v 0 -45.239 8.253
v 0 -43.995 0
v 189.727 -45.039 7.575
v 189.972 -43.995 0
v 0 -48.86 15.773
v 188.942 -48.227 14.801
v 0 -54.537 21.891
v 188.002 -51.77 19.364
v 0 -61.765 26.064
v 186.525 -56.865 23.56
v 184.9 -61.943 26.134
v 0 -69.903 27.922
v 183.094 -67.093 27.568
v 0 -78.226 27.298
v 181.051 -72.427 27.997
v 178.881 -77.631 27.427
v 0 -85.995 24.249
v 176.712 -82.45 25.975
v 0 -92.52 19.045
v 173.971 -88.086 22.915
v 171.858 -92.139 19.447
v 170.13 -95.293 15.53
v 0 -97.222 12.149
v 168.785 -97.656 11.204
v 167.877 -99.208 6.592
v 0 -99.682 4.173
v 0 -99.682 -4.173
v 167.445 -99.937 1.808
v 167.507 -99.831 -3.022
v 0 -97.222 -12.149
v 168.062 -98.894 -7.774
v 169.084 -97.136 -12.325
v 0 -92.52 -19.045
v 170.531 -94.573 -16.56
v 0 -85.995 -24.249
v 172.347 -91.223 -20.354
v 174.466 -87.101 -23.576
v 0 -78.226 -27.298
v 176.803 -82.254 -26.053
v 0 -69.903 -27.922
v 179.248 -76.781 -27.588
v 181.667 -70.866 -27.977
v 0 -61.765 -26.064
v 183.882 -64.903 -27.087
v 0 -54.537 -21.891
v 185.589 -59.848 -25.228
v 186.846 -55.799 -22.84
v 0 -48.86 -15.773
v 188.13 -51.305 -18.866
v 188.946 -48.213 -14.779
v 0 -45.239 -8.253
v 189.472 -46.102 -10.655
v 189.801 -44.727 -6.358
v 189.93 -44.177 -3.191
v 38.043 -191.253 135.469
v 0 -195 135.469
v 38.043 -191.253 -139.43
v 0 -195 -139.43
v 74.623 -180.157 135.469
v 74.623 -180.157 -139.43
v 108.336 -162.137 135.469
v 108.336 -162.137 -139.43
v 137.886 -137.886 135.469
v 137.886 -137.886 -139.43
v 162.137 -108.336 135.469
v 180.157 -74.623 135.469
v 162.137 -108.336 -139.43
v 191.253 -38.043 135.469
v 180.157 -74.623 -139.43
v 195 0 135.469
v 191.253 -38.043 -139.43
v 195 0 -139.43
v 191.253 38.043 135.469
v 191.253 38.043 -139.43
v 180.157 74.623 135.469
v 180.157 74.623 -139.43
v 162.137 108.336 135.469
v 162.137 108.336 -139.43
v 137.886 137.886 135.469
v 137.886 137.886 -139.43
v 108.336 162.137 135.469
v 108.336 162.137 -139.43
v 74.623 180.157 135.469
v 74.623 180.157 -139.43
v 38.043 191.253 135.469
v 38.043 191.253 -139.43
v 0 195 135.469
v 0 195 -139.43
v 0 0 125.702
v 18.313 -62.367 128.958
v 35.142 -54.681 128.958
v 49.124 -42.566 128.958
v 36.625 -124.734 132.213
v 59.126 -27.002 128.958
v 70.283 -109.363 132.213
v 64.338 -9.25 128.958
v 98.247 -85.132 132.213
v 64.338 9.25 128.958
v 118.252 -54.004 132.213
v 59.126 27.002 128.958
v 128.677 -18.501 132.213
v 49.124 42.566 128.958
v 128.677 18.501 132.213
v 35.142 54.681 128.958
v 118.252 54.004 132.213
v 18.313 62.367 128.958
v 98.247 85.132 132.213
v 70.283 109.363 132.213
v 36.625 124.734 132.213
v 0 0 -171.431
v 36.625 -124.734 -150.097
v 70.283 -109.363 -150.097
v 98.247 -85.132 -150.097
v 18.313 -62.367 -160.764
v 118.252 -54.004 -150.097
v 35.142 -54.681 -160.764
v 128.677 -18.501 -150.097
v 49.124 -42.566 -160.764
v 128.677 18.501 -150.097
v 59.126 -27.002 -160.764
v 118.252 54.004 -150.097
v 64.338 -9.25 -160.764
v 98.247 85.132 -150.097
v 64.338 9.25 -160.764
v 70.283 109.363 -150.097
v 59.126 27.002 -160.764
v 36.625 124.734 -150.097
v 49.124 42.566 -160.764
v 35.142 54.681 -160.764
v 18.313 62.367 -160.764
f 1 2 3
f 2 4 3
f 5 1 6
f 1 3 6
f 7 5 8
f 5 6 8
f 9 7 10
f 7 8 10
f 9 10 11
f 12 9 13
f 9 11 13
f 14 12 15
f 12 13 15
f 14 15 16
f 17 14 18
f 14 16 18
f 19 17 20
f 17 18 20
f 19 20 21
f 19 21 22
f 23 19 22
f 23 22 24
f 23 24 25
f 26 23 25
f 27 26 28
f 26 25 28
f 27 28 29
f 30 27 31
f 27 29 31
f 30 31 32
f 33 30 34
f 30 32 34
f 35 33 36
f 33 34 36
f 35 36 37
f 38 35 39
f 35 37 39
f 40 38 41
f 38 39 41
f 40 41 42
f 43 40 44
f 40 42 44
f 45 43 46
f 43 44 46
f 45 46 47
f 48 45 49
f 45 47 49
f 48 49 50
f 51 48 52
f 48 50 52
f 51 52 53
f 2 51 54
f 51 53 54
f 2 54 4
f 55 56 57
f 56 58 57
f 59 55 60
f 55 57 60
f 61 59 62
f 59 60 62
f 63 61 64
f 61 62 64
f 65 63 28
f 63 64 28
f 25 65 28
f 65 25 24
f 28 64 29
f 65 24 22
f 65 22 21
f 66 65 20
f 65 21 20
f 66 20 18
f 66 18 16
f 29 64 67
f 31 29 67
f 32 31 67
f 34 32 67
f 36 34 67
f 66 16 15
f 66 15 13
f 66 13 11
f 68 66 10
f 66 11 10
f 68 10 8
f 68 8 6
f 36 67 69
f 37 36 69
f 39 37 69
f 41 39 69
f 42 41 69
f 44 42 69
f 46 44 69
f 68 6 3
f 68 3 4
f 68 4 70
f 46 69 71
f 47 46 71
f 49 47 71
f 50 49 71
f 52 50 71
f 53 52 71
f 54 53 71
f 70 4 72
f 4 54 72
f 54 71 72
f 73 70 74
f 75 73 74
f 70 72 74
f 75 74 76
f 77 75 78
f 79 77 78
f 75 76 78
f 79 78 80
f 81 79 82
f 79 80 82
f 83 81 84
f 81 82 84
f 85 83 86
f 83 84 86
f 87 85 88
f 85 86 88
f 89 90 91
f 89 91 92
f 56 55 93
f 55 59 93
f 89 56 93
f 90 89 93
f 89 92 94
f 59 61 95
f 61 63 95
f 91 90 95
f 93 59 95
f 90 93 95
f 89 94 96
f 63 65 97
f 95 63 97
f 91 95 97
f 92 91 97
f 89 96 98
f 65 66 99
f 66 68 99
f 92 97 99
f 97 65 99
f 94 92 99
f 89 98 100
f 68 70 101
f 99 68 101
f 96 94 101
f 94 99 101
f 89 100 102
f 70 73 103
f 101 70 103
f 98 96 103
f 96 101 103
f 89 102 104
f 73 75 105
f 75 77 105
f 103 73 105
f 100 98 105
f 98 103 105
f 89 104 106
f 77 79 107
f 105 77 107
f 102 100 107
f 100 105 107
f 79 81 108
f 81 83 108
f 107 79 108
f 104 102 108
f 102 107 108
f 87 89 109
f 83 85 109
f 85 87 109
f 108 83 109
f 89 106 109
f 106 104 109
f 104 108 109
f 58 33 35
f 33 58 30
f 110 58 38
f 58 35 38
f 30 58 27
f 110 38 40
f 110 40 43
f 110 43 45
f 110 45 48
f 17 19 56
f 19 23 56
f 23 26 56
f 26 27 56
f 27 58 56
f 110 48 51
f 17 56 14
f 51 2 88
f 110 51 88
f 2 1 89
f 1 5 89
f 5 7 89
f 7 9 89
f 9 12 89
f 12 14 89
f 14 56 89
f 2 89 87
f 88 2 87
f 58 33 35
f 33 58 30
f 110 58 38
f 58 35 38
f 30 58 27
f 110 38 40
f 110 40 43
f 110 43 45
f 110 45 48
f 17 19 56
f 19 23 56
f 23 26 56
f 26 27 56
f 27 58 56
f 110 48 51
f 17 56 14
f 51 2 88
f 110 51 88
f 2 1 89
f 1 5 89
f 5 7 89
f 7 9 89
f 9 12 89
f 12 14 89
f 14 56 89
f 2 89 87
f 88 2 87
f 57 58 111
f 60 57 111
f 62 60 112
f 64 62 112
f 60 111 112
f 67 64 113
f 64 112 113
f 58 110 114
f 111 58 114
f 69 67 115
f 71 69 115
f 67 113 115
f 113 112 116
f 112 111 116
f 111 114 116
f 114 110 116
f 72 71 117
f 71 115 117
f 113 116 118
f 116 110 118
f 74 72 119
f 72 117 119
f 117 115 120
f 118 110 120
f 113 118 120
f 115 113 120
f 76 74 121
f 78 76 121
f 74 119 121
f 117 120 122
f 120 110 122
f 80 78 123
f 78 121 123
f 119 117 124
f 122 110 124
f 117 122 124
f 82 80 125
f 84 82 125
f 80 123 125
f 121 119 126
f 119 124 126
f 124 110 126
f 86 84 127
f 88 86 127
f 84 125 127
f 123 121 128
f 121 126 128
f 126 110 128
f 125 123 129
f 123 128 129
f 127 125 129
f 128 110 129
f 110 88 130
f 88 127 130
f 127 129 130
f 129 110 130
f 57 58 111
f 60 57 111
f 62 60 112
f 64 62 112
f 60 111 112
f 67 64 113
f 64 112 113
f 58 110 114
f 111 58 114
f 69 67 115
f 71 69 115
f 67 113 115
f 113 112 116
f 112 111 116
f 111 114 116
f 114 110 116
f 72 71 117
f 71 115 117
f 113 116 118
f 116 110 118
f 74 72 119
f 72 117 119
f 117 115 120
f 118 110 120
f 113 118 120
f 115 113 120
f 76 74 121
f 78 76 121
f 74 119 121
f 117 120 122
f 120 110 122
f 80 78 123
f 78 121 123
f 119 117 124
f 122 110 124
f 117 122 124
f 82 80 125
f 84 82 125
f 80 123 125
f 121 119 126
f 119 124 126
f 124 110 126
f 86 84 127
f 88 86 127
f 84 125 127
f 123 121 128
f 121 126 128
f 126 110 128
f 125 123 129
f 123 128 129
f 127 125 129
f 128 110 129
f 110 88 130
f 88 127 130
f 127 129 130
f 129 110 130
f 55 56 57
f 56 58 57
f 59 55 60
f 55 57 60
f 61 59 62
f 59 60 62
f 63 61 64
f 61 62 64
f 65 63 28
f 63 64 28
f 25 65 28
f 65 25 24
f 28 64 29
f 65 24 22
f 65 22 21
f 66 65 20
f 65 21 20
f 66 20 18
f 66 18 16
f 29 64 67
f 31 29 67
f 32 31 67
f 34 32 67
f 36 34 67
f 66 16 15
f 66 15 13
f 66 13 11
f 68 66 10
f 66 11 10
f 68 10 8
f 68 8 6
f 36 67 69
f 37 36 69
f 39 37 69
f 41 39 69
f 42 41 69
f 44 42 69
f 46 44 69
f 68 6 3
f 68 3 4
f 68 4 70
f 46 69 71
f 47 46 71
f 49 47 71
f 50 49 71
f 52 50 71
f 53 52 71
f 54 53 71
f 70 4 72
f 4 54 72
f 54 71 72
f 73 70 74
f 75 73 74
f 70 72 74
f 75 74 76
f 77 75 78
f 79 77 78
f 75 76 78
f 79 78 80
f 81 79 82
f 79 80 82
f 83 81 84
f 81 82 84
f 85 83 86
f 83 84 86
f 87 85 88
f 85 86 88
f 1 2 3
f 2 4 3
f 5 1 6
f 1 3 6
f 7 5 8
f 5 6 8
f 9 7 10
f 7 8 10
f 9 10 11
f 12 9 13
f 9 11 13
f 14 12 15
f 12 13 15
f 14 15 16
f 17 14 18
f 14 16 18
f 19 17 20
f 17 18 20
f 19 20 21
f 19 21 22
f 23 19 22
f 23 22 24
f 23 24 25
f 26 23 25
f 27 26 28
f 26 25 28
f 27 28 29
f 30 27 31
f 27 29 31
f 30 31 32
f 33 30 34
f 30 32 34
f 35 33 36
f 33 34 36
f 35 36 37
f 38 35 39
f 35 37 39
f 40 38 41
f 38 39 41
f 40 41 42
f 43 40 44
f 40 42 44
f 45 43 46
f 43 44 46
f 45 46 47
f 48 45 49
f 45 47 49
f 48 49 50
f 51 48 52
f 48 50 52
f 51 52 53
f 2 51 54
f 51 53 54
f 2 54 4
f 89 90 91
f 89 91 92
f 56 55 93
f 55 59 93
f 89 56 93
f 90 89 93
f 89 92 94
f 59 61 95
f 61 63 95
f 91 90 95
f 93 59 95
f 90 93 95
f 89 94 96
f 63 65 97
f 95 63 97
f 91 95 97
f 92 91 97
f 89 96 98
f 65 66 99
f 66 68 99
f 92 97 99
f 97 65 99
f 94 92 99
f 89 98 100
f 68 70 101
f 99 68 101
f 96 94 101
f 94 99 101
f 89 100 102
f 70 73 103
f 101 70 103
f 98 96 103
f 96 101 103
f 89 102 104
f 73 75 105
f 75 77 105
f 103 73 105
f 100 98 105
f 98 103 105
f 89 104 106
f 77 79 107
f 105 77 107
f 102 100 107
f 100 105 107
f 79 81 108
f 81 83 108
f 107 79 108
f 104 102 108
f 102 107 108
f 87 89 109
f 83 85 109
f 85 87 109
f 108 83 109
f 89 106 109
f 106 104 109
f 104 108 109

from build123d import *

# Parameters (mm, degrees)
F1_ANGLE = 180
F2_ANGLE = 180
F3_R     = 28
F4_DEPTH = 250


with BuildPart() as f1:
    # F0 (on Right) → F1 (revolve)
    with BuildSketch(Plane.YZ):
        Polygon((0, 125.701755), (-195, 135.469316), (-195, -139.430394), (0, -171.431184), (0, -92.728153), (0, 0), align=None)
    revolve(axis=Axis((0, 0, 62.850878), (0, 0, 1)), revolution_arc=F1_ANGLE)


with BuildPart() as f2:
    # F0 (on Right) → F2 (revolve)
    with BuildSketch(Plane.YZ):
        Polygon((0, 125.701755), (-195, 135.469316), (-195, -139.430394), (0, -171.431184), (0, -92.728153), (0, 0), align=None)
    revolve(axis=Axis((0, 0, 62.850878), (0, 0, 1)), revolution_arc=F2_ANGLE)


with BuildPart() as f4:
    # F3 (on Right) → F4 (new body, symmetric)
    with BuildSketch(Plane.YZ):
        with Locations((-71.995, 0)):
            Circle(F3_R)
    extrude(amount=F4_DEPTH, both=True)


with BuildPart() as f2_1:
    add(f2.part)

    # F5: cut F4
    add(f4.part, mode=Mode.SUBTRACT)


with BuildPart() as f1_1:
    add(f1.part)

    # F6: cut F4
    add(f4.part, mode=Mode.SUBTRACT)


solid = Compound([f2_1.part, f1_1.part])
